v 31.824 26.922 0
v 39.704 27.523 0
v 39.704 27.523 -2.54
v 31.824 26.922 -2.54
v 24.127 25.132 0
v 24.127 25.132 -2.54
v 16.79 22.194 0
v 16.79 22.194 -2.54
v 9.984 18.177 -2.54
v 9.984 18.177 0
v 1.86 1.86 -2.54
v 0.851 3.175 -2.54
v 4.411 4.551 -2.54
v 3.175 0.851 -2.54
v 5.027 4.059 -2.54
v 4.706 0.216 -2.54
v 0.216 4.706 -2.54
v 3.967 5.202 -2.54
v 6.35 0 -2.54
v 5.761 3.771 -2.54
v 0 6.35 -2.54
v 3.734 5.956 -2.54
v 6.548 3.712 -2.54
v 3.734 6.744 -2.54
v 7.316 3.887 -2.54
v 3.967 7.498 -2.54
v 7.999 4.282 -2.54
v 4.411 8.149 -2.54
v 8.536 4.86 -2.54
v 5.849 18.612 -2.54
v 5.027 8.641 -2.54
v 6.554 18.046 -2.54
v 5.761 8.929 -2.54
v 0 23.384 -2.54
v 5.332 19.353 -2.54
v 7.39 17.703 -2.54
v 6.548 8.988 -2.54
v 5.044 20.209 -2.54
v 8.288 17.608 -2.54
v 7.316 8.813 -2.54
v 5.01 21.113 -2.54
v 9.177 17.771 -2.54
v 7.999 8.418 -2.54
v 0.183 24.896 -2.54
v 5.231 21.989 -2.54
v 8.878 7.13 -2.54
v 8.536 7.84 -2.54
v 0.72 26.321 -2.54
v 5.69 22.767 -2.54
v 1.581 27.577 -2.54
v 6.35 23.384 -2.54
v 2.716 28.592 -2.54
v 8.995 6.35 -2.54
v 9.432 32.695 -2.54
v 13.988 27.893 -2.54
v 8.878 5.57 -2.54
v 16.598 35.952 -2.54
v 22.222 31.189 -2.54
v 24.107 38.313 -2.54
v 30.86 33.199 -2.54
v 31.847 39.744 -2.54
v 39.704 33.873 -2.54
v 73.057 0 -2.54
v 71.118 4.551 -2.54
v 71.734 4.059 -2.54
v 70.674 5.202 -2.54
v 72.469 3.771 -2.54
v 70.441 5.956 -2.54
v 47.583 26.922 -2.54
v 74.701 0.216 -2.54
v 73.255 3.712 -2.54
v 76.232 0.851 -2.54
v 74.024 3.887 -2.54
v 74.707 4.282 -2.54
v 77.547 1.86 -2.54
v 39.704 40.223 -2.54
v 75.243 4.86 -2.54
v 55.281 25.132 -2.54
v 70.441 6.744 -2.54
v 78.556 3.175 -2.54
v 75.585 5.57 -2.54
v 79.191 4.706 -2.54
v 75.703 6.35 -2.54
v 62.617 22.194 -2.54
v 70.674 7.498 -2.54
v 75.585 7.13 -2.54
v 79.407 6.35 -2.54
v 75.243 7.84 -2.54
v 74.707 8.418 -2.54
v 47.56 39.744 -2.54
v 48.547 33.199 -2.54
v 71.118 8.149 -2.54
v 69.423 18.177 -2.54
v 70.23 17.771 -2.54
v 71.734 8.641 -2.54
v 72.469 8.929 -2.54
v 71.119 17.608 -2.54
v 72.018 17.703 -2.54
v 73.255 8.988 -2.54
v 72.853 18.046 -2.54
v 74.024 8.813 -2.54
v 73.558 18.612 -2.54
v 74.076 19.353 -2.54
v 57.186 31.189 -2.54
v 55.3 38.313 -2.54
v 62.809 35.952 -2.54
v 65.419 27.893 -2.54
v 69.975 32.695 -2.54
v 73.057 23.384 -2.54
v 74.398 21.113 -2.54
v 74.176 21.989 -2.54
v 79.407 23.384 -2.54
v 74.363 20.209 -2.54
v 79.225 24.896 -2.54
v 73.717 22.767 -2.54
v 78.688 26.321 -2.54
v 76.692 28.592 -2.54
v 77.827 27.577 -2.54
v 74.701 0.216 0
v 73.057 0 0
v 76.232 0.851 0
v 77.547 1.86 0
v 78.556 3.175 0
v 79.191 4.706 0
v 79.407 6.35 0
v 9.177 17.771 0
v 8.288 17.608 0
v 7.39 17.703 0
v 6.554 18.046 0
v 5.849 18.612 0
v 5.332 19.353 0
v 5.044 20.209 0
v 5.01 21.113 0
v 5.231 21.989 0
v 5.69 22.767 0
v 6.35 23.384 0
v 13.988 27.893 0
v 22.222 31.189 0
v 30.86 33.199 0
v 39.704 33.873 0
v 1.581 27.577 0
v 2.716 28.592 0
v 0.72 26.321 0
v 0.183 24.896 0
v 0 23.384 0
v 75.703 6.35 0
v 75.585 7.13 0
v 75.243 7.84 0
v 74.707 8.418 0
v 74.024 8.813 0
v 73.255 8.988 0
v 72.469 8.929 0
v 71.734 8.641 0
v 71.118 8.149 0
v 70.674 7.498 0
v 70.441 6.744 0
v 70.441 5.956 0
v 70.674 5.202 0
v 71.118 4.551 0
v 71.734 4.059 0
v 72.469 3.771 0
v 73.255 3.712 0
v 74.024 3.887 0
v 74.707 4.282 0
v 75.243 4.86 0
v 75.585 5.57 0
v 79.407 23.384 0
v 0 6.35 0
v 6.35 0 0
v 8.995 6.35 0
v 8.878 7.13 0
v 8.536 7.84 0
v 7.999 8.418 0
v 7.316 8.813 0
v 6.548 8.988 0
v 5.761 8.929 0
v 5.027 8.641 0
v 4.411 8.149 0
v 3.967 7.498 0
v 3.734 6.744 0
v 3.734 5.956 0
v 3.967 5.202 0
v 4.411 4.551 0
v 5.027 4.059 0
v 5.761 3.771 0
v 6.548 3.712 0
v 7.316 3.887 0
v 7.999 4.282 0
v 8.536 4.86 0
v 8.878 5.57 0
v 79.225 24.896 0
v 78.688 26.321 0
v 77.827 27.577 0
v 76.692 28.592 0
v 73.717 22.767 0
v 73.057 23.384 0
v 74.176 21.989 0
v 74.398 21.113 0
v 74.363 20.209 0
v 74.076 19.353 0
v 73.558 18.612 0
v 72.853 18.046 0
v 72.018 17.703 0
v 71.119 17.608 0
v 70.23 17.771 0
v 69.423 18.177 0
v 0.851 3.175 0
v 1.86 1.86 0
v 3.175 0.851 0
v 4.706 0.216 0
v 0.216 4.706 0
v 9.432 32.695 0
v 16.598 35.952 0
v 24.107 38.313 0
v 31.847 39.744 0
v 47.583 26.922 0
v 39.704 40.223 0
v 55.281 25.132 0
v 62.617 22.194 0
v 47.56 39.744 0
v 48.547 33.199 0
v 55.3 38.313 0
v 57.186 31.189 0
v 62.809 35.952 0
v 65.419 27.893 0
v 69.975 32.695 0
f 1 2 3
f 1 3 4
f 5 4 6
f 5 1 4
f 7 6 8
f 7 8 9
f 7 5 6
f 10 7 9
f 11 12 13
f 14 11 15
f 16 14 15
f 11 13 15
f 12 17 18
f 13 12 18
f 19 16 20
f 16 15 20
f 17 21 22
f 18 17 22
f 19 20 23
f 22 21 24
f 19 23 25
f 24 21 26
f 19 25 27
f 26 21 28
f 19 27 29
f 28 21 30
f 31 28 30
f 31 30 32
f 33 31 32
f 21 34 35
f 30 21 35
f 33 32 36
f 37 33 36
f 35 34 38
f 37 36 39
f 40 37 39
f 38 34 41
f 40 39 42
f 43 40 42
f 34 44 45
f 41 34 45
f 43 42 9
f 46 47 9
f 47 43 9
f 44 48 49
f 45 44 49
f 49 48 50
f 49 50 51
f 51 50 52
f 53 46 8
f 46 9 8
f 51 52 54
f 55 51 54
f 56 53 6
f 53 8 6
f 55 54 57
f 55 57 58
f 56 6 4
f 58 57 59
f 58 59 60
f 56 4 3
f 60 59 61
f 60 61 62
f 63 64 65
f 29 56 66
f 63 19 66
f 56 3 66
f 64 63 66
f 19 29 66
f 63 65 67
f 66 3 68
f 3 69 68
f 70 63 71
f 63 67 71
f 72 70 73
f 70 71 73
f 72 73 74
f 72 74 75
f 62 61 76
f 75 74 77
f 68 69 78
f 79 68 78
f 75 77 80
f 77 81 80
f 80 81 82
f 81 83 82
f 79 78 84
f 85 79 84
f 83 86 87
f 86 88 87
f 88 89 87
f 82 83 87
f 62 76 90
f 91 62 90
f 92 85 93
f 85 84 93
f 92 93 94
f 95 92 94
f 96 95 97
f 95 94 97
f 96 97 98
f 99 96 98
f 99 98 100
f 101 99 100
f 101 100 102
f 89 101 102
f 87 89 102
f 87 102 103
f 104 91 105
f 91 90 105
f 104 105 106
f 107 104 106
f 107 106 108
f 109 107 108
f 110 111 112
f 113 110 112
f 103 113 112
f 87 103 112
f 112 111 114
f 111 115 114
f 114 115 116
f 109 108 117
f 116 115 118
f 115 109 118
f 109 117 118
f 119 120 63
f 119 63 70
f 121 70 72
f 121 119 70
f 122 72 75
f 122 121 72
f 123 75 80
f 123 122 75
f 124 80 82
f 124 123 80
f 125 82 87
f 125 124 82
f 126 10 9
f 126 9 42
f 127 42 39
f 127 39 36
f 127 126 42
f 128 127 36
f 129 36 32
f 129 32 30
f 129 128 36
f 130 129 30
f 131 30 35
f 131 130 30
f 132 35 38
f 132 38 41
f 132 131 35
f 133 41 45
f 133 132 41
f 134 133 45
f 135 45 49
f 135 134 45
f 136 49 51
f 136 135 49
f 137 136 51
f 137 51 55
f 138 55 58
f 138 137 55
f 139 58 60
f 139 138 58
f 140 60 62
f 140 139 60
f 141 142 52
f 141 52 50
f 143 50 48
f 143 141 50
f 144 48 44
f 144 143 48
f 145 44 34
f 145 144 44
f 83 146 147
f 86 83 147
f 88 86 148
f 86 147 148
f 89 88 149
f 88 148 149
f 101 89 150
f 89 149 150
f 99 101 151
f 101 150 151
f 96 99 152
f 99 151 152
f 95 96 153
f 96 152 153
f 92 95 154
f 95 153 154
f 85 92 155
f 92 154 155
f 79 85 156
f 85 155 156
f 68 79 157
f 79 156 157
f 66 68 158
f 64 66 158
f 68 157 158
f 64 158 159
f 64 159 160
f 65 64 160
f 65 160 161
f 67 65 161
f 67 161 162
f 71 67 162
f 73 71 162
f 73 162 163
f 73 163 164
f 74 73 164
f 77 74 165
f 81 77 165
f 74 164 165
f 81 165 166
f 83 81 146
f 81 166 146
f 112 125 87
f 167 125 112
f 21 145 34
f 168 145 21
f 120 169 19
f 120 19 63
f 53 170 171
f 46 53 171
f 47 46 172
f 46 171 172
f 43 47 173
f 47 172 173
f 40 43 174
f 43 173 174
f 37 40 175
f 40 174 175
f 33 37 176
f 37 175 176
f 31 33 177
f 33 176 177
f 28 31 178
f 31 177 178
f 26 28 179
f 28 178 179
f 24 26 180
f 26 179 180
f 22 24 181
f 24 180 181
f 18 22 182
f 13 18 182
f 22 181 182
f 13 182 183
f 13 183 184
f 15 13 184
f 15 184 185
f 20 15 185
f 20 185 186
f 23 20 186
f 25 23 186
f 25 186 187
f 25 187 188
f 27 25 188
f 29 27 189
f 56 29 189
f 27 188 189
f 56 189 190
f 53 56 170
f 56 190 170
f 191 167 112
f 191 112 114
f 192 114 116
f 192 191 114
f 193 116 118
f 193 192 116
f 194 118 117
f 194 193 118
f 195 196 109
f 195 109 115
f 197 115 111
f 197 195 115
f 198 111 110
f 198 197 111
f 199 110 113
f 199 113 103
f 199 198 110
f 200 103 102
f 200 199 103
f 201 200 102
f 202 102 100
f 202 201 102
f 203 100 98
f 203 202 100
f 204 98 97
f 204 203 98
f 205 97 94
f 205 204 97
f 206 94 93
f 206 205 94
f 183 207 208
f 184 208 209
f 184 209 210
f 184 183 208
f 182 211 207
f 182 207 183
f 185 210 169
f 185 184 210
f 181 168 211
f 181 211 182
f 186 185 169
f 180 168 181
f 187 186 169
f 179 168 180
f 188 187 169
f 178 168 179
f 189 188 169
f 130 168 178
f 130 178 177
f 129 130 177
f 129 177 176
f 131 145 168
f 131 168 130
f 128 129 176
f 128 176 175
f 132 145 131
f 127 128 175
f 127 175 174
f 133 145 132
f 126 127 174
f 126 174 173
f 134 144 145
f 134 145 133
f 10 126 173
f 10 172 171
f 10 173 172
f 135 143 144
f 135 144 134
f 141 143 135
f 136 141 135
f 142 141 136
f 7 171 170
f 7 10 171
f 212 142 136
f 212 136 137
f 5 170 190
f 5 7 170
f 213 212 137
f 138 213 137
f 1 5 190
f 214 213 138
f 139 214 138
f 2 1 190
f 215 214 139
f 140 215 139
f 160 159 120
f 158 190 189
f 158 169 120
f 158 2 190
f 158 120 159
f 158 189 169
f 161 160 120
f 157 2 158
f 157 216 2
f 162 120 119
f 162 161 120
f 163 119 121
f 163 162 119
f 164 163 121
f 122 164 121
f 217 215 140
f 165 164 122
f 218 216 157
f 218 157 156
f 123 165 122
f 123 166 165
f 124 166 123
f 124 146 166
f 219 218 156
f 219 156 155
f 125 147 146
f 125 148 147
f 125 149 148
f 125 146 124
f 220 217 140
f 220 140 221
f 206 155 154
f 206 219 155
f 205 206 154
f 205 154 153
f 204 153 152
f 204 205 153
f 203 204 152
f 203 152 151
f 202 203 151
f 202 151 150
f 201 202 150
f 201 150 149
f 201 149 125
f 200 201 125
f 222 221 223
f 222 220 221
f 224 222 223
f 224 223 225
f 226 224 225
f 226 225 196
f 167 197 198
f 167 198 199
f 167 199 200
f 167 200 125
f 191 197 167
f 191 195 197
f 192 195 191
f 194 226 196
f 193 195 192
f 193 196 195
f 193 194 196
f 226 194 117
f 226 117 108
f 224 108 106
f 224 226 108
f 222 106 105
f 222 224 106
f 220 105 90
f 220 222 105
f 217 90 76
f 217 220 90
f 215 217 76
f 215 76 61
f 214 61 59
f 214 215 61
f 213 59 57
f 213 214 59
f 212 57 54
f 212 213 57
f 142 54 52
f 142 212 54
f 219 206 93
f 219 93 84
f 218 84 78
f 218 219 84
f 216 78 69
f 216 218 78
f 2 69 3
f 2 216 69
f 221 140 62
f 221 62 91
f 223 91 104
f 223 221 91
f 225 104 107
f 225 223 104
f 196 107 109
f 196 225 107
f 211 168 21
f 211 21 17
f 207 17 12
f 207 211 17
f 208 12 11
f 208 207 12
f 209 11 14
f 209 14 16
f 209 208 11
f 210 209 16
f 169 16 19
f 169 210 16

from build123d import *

# Parameters (mm, degrees)
SKETCH1_R           = 2.645472677
BOSS_EXTRUDE1_DEPTH = 2.54


with BuildPart() as part:
    # Sketch1 → Boss-Extrude1 (new body)
    # profile 1 of 2: a face of its own
    with BuildSketch(Plane.XY):
        with BuildLine():
            ThreePointArc((2.715551876, 28.591516871), (0.719669389, 26.320778151), (0, 23.384474828))
            Line((0, 23.384474828), (0, 6.35))
            ThreePointArc((0, 6.35), (1.859871939, 1.859871939), (6.35, 0))
            Line((6.35, 0), (39.703606091, 0))
            Line((39.703606091, 0), (39.703606091, 27.523486691))
            ThreePointArc((39.703606091, 27.523486691), (24.126563096, 25.131896001), (9.984448124, 18.177432785))
            ThreePointArc((9.984448124, 18.177432785), (5.563703041, 18.963729745), (6.35, 23.384474828))
            ThreePointArc((6.35, 23.384474828), (22.221598132, 31.189420948), (39.703606091, 33.873486691))
            Line((39.703606091, 33.873486691), (39.703606091, 40.223486691))
            ThreePointArc((39.703606091, 40.223486691), (20.316633168, 37.246945895), (2.715551876, 28.591516871))
        make_face()
        with Locations((6.35, 6.35)):
            Circle(SKETCH1_R, mode=Mode.SUBTRACT)
    # profile 2 of 2: a face of its own
    with BuildSketch(Plane.XY):
        with BuildLine():
            ThreePointArc((76.691660306, 28.591516871), (59.090579014, 37.246945895), (39.703606091, 40.223486691))
            Line((39.703606091, 40.223486691), (39.703606091, 33.873486691))
            ThreePointArc((39.703606091, 33.873486691), (57.18561405, 31.189420948), (73.057212182, 23.384474828))
            ThreePointArc((73.057212182, 23.384474828), (73.843509142, 18.963729745), (69.422764059, 18.177432785))
            ThreePointArc((69.422764059, 18.177432785), (55.280649086, 25.131896001), (39.703606091, 27.523486691))
            Line((39.703606091, 27.523486691), (39.703606091, 0))
            Line((39.703606091, 0), (73.057212182, 0))
            ThreePointArc((73.057212182, 0), (77.547340243, 1.859871939), (79.407212182, 6.35))
            Line((79.407212182, 6.35), (79.407212182, 23.384474828))
            ThreePointArc((79.407212182, 23.384474828), (78.687542794, 26.320778151), (76.691660306, 28.591516871))
        make_face()
        with Locations((73.057212182, 6.35)):
            Circle(SKETCH1_R, mode=Mode.SUBTRACT)
    extrude(amount=-BOSS_EXTRUDE1_DEPTH)


solid = part.part
